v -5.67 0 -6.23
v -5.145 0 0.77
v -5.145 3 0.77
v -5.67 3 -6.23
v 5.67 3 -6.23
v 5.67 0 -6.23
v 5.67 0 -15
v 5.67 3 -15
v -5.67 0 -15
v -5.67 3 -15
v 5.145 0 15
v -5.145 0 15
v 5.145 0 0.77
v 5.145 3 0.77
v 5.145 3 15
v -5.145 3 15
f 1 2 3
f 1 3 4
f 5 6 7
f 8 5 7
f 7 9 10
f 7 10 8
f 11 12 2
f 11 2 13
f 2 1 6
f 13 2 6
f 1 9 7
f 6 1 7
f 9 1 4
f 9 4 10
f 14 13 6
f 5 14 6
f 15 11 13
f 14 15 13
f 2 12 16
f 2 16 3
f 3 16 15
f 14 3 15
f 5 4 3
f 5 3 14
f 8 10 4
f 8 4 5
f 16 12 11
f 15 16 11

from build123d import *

# Parameters (mm, degrees)
SKETCH1_W           = 11.34
SKETCH1_H           = 30
BOSS_EXTRUDE1_DEPTH = 3
CUT_EXTRUDE1_START  = -4
CUT_EXTRUDE1_DEPTH  = 5


with BuildPart() as part:
    # Sketch1 → Boss-Extrude1 (new body)
    with BuildSketch(Plane(origin=(0, 0, 0), x_dir=(1, 0, 0), z_dir=(0, 1, 0))):
        Rectangle(SKETCH1_W, SKETCH1_H)
    extrude(amount=BOSS_EXTRUDE1_DEPTH)

    # Sketch2 → Cut-Extrude1 (cut)
    with BuildSketch(Plane(origin=(0, 3, 0), x_dir=(1, 0, 0), z_dir=(0, 1, 0)).offset(CUT_EXTRUDE1_START)):
        Polygon((-5.145, -15), (-5.145, -0.77), (-5.67, 6.23), (-5.67, -15), align=None)
    cut_extrude1 = extrude(amount=CUT_EXTRUDE1_DEPTH, mode=Mode.SUBTRACT)

    # Mirror1: Cut-Extrude1 across plane
    add(cut_extrude1.mirror(Plane(origin=(0, 0, 0), x_dir=(0, 0, 1), z_dir=(1, 0, 0))), mode=Mode.SUBTRACT)


solid = part.part
